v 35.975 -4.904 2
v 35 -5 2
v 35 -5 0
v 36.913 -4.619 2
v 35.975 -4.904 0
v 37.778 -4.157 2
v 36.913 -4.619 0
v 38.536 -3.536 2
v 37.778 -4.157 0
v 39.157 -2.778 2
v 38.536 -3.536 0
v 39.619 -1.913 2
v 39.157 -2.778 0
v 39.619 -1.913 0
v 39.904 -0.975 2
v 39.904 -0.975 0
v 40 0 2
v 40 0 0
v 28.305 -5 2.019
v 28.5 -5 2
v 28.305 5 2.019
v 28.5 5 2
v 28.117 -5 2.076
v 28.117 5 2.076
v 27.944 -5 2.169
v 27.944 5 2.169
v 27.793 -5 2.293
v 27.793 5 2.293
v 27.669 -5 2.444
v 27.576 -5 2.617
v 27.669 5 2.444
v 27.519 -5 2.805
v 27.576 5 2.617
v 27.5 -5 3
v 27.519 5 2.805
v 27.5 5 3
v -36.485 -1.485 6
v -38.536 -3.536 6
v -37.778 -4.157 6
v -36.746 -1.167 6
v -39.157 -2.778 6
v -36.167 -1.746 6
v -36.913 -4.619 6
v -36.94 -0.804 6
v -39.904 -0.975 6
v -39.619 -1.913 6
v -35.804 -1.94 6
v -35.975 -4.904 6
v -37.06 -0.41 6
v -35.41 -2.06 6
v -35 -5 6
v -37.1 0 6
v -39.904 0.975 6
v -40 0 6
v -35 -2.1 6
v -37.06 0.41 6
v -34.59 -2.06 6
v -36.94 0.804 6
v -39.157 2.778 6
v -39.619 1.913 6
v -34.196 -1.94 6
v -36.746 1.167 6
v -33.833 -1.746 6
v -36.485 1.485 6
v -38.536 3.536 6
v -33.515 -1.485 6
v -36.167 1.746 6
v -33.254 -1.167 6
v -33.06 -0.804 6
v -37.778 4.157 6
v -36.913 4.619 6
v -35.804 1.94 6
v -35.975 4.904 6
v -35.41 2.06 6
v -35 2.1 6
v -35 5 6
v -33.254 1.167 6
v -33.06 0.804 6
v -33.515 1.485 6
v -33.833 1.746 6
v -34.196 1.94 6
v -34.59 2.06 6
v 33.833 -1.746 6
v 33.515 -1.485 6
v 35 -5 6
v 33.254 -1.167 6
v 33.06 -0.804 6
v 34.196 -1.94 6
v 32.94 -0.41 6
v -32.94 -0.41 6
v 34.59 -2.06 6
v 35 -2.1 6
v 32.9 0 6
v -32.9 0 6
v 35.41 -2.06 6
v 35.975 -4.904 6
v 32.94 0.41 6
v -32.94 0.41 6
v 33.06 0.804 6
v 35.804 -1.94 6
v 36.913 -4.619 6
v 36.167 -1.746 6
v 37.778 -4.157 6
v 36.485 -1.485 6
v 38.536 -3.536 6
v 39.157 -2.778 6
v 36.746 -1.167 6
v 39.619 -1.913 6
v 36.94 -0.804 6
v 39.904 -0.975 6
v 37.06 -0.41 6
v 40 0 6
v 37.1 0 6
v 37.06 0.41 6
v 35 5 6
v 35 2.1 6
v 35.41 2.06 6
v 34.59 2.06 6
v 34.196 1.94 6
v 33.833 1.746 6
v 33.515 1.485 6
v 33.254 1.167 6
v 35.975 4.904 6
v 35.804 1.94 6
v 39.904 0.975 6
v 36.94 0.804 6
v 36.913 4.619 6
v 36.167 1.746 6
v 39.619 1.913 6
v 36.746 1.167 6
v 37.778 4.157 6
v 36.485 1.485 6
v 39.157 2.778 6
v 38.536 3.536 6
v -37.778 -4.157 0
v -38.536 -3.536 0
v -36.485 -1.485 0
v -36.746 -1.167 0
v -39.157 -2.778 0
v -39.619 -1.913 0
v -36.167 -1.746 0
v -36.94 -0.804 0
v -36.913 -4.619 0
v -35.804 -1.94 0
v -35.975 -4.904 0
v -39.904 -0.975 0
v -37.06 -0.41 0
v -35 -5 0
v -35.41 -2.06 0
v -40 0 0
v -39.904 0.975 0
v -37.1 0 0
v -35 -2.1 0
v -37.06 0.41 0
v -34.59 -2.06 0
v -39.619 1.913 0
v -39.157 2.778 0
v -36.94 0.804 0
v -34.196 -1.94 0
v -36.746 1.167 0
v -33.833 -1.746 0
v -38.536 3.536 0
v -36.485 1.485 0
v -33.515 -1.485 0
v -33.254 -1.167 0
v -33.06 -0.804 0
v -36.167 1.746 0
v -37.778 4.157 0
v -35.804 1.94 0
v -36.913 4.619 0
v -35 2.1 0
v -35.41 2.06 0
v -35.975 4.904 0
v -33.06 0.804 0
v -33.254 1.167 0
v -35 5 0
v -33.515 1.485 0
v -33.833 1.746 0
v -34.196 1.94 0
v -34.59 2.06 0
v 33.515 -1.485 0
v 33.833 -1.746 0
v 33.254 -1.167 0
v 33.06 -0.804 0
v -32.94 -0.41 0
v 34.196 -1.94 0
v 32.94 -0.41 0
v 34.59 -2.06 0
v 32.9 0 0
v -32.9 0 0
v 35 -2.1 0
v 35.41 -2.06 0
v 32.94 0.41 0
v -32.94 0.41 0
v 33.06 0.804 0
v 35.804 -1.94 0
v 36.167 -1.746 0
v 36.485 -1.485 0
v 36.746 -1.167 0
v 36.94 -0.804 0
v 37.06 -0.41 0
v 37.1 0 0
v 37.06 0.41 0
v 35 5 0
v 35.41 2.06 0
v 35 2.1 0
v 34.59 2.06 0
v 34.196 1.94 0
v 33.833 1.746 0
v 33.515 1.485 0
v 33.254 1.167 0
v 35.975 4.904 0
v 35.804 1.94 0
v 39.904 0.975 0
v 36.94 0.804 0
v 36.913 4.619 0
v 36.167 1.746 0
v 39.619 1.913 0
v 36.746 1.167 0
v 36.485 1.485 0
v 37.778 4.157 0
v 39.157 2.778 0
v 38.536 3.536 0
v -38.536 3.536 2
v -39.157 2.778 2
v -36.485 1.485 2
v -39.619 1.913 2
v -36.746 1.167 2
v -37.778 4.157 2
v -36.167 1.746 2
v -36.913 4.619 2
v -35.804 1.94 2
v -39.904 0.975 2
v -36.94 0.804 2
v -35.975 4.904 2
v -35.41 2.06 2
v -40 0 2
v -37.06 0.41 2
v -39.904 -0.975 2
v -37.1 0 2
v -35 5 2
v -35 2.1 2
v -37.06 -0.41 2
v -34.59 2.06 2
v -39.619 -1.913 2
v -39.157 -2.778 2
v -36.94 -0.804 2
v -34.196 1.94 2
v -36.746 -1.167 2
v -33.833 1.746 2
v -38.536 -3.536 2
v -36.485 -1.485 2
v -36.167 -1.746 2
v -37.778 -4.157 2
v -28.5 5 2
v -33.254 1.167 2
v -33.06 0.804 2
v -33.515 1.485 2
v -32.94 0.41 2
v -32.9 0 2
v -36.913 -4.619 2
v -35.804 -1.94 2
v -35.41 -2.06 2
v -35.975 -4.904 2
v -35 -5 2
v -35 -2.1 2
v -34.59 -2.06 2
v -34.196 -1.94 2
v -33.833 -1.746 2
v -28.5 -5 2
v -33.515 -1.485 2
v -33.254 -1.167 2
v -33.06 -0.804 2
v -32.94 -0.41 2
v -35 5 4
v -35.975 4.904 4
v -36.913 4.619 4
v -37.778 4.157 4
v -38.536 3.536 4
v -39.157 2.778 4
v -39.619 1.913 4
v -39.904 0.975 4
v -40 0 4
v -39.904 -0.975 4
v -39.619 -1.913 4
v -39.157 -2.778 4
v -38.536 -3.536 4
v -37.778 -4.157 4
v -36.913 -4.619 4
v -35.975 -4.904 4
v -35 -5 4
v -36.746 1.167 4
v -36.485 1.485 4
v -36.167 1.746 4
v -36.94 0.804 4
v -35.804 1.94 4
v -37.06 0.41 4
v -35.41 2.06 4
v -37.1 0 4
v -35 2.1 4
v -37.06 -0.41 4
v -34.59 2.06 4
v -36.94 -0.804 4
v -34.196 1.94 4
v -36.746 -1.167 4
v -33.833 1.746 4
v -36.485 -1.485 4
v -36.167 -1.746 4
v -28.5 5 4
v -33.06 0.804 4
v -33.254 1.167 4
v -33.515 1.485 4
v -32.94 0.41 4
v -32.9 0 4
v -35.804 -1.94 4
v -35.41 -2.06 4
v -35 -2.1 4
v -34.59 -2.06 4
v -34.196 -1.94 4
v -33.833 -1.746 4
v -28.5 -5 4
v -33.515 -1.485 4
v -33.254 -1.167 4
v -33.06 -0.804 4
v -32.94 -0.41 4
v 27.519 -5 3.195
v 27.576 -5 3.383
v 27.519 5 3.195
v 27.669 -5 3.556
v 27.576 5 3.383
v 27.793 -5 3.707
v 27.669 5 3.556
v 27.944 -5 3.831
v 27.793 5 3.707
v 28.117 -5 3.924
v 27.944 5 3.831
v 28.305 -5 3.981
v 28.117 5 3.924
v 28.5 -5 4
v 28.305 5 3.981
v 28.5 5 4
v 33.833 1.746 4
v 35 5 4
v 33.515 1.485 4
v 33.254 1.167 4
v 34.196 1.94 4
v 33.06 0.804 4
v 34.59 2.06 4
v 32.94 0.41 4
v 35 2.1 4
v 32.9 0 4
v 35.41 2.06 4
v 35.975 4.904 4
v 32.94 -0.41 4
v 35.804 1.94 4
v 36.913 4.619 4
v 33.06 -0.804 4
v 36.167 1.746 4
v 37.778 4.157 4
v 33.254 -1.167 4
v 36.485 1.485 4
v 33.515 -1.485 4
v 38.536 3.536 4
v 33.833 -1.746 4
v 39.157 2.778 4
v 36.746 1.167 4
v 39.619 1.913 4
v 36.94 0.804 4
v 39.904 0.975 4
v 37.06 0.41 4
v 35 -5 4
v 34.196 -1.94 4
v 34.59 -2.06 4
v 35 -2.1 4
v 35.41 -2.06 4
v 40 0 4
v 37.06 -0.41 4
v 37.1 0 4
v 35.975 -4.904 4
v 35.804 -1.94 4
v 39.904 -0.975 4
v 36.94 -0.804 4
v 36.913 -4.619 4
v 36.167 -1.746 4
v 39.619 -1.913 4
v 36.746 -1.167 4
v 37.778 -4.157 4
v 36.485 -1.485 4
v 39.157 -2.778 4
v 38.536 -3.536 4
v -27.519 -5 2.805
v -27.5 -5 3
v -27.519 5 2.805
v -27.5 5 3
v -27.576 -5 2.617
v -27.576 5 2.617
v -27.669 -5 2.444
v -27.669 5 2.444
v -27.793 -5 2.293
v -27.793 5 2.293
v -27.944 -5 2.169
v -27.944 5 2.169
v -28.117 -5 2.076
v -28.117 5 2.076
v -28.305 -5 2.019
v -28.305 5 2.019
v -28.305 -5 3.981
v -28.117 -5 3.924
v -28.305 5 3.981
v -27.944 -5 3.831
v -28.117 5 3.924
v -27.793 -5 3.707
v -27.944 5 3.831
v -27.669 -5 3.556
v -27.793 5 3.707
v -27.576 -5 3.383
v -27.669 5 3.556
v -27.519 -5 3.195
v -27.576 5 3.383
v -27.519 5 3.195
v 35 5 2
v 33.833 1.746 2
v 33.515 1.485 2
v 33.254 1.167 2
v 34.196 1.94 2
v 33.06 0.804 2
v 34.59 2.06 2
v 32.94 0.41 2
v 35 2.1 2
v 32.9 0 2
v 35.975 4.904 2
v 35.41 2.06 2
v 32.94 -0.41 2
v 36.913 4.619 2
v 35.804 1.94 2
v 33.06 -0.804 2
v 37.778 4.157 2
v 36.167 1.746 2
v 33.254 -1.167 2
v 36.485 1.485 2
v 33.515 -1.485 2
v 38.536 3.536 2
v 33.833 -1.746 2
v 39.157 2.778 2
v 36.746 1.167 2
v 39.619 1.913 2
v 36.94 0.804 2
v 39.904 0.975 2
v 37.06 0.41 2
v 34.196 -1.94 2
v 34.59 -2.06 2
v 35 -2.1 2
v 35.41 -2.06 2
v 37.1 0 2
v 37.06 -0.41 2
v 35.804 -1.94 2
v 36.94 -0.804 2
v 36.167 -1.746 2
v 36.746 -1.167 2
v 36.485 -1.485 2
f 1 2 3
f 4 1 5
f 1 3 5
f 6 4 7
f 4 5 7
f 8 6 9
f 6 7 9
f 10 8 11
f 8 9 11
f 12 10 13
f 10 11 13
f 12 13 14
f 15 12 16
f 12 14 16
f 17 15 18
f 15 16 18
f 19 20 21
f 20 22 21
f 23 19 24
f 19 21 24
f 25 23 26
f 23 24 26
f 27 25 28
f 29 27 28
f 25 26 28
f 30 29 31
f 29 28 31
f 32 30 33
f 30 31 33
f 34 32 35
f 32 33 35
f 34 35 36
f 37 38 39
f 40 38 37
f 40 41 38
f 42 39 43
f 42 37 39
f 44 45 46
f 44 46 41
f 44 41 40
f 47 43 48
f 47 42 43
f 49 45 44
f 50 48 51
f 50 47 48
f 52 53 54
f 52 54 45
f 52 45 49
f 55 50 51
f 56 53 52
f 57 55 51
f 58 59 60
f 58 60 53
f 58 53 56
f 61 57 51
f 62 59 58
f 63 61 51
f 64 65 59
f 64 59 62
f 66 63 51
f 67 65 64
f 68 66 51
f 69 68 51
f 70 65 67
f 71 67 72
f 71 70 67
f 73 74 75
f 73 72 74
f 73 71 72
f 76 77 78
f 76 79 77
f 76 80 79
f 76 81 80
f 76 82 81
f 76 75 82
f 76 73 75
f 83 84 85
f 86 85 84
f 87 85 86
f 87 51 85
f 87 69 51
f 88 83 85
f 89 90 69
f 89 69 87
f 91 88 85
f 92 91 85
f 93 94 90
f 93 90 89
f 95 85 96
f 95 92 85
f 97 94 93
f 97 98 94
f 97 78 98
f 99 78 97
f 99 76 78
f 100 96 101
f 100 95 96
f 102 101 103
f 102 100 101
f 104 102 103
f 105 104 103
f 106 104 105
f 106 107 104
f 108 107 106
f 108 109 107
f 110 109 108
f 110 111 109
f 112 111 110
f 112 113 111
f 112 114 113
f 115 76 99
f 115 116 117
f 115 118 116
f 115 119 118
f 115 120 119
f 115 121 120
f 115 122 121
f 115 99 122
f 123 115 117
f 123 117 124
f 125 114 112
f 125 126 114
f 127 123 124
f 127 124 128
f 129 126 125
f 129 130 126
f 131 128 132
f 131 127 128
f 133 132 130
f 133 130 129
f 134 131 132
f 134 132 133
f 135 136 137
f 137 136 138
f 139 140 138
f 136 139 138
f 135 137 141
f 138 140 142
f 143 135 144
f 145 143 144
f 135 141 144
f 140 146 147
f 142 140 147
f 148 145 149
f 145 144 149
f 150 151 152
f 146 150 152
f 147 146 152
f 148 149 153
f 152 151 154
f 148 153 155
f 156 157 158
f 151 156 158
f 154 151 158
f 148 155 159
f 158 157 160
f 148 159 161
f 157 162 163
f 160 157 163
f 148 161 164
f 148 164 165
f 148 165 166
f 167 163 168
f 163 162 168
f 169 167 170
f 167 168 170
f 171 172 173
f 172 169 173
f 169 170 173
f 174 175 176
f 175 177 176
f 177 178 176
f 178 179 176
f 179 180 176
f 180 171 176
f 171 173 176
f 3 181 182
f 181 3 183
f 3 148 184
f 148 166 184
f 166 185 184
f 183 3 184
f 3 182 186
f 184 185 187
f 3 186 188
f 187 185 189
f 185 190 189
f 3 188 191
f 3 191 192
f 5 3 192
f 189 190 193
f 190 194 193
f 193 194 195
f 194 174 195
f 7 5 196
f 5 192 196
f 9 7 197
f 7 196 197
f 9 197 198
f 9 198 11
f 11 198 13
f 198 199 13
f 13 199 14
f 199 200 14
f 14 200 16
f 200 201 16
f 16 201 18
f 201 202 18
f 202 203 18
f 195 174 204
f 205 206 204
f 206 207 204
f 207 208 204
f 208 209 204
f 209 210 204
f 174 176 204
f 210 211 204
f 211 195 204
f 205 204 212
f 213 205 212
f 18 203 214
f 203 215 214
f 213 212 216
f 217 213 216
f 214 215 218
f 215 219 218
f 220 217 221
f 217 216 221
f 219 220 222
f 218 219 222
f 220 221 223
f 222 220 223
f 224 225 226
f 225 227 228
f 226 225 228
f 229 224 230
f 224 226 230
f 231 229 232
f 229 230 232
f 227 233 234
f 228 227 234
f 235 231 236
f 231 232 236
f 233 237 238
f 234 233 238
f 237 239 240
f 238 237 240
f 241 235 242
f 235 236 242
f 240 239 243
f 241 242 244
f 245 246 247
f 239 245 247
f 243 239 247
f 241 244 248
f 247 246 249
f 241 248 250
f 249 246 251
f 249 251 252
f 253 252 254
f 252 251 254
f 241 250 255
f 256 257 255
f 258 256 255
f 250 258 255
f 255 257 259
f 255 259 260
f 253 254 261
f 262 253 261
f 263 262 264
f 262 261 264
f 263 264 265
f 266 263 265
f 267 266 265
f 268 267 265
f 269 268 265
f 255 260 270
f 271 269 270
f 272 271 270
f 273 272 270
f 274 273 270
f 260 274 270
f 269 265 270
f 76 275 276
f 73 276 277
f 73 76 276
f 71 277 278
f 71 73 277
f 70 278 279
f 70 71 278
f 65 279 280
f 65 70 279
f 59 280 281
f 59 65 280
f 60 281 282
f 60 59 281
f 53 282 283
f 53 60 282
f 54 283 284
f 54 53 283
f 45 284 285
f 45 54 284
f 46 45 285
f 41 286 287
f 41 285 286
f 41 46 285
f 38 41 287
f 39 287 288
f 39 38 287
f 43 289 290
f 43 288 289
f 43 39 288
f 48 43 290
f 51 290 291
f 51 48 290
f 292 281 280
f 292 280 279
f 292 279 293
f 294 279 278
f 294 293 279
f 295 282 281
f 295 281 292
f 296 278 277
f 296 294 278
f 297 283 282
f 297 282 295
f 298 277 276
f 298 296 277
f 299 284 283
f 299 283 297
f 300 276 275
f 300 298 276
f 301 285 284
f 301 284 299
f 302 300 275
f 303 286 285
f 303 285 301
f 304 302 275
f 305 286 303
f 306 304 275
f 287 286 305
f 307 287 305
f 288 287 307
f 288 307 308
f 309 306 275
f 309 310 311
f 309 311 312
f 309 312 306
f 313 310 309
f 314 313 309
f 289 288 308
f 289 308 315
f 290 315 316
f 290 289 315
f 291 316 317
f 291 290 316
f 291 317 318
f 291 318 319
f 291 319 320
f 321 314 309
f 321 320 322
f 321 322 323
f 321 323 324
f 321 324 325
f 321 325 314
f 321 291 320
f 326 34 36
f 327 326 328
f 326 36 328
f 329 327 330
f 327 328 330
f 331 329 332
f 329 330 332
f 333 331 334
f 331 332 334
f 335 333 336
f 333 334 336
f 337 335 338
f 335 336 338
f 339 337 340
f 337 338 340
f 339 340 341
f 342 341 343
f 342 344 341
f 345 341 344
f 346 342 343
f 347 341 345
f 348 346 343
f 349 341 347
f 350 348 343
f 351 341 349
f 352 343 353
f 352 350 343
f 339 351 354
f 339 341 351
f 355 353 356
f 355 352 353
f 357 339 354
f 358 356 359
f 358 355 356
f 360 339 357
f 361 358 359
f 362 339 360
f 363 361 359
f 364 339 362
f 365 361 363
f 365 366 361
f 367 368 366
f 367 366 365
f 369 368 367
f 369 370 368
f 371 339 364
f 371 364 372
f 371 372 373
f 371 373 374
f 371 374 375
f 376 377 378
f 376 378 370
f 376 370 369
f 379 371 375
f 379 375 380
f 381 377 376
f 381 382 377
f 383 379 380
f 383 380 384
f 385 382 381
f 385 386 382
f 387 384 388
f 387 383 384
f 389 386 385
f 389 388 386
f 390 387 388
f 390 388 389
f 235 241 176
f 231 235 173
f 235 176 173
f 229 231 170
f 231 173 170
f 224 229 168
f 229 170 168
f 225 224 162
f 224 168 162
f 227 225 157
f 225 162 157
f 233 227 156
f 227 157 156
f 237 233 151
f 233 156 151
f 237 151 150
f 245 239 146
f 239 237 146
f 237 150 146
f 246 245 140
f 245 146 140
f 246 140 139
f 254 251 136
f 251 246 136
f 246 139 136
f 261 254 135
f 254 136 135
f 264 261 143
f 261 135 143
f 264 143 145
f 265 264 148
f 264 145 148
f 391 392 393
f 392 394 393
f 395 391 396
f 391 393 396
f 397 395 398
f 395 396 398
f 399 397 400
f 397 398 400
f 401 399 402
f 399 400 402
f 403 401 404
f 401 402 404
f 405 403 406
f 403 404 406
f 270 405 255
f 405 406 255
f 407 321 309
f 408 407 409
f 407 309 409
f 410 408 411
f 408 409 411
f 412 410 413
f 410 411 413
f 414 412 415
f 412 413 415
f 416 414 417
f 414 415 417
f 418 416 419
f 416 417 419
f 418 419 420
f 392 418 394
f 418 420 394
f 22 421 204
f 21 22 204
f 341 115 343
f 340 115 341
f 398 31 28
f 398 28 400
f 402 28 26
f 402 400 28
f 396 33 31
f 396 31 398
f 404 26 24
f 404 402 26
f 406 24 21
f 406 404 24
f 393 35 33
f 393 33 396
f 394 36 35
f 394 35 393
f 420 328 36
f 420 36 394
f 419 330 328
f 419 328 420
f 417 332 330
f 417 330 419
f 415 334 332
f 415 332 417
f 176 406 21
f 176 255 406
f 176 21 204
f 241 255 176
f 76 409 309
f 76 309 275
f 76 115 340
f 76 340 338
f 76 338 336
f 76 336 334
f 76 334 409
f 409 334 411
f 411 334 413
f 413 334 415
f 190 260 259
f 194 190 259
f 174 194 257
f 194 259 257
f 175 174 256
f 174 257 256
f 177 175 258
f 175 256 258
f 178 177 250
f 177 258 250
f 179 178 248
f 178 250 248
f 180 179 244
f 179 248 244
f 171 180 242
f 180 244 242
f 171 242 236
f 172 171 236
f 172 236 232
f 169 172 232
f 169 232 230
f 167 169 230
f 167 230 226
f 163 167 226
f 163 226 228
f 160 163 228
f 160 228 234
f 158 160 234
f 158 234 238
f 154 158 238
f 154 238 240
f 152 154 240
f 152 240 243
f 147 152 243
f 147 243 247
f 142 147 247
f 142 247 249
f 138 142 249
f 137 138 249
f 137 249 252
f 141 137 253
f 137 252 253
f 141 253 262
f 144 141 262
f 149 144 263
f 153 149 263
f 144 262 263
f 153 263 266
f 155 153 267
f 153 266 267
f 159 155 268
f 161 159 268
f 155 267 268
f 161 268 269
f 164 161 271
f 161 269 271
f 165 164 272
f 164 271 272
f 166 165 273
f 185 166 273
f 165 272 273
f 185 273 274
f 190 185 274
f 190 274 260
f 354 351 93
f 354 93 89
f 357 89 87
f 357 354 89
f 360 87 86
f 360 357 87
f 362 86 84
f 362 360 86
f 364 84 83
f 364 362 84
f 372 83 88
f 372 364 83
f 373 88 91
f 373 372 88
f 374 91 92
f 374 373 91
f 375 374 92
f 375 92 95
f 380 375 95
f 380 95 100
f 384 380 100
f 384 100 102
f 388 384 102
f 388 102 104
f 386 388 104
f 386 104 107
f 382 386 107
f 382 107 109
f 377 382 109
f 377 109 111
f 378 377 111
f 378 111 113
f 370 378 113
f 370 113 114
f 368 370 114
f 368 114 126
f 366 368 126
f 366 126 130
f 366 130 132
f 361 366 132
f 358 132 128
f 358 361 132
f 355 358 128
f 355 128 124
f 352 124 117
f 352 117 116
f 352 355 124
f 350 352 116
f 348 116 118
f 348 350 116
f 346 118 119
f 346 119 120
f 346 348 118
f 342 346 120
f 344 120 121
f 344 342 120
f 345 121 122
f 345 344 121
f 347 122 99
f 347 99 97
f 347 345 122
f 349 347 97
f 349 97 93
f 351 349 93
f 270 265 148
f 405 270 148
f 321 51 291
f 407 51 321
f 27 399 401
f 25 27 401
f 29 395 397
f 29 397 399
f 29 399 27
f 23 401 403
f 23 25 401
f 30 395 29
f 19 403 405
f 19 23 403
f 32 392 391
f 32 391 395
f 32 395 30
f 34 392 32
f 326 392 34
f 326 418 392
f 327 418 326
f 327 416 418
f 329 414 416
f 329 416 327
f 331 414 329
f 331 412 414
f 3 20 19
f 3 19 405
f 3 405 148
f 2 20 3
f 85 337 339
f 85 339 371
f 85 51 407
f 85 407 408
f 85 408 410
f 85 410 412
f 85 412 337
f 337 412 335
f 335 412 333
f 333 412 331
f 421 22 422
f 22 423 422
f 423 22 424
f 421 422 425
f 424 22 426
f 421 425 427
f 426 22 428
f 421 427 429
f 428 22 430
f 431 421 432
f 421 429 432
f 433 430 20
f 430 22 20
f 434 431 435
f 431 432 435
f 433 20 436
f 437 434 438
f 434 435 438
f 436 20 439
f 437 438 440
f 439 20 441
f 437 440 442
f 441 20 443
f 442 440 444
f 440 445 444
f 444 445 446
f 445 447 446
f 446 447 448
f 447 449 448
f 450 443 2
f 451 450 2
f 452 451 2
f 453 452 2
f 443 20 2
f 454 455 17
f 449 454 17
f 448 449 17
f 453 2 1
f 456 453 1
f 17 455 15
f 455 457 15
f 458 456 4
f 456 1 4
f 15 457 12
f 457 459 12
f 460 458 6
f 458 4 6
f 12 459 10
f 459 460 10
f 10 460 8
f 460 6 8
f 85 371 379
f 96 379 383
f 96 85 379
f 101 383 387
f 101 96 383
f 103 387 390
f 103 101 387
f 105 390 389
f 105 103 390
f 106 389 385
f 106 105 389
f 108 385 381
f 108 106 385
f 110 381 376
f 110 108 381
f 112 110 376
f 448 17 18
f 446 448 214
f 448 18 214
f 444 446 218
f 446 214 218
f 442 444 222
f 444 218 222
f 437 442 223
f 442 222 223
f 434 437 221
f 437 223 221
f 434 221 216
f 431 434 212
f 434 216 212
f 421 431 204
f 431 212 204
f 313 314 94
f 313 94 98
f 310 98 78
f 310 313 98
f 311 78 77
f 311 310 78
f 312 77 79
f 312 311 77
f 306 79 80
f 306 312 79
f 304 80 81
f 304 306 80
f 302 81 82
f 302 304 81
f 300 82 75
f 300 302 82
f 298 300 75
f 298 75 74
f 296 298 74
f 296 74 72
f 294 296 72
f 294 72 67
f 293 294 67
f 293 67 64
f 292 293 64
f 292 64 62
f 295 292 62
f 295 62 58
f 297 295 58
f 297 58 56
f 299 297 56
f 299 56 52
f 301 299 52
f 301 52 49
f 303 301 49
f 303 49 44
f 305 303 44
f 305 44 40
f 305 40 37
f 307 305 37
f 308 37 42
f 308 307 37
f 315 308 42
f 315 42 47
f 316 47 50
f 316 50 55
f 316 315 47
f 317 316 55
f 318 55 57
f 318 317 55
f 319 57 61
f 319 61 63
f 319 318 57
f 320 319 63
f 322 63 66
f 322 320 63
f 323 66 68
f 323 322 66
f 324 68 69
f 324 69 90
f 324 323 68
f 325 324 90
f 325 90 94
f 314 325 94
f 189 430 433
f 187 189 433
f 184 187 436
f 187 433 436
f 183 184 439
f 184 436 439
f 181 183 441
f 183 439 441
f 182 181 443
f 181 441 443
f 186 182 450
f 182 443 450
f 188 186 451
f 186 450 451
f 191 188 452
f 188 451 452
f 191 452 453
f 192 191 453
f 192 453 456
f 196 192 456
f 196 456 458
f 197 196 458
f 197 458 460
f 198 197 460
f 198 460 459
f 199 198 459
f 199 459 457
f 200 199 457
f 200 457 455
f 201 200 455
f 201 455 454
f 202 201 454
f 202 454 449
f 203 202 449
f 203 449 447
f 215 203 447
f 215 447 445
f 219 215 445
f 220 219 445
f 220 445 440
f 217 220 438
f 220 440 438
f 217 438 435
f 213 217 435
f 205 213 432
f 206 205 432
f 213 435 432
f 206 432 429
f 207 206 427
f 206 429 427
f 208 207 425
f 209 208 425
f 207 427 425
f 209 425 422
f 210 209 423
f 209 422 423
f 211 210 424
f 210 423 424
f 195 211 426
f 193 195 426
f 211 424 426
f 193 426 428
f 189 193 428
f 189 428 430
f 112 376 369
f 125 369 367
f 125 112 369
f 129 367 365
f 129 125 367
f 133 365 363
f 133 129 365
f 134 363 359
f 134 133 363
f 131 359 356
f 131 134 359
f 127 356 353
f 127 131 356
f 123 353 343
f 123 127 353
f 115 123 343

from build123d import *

# Parameters (mm, degrees)
BOSS_EXTRUDE1_DEPTH     = 6
SKETCH2_R               = 2.1
CUT_EXTRUDE1_DEPTH      = 41.755367745
CUT_EXTRUDE2_DEPTH      = 10
CUT_EXTRUDE2_DEPTH_BACK = 10
SKETCH3_W               = 25
SKETCH3_H               = 2
FILLET5_R               = 1


with BuildPart() as part:
    # Sketch1 → Boss-Extrude1 (new body)
    with BuildSketch(Plane.XY):
        with BuildLine():
            ThreePointArc((35, -5), (30, 0), (35, 5))
            Line((35, 5), (-35, 5))
            ThreePointArc((-35, 5), (-31.464466094, 3.535533906), (-30, 0))
            ThreePointArc((-30, 0), (-31.464466094, -3.535533906), (-35, -5))
            Line((-35, -5), (35, -5))
        make_face()
        with BuildLine():
            ThreePointArc((-30, 0), (-31.464466094, 3.535533906), (-35, 5))
            ThreePointArc((-35, 5), (-40, 0), (-35, -5))
            ThreePointArc((-35, -5), (-31.464466094, -3.535533906), (-30, 0))
        make_face()
        with BuildLine():
            ThreePointArc((40, 0), (38.535533906, 3.535533906), (35, 5))
            ThreePointArc((35, 5), (30, 0), (35, -5))
            ThreePointArc((35, -5), (38.535533906, -3.535533906), (40, 0))
        make_face()
    extrude(amount=BOSS_EXTRUDE1_DEPTH)

    # Sketch2 → Cut-Extrude1 (cut, through all)
    with BuildSketch(Plane.XY.offset(6)):
        with Locations((-35, 0)):
            Circle(SKETCH2_R)
        with Locations(Location((35, 0, 0), (0, 0, 180))):
            Circle(SKETCH2_R)
    extrude(amount=-CUT_EXTRUDE1_DEPTH, mode=Mode.SUBTRACT)

    # Sketch3 → Cut-Extrude2 (cut, two sides: drawn at the far end of the back side and taken through both)
    with BuildSketch(Plane(origin=(0, 0, 0), x_dir=(1, 0, 0), z_dir=(0, 1, 0)).offset(-CUT_EXTRUDE2_DEPTH_BACK)):
        with Locations((-40, -3)):
            Rectangle(SKETCH3_W, SKETCH3_H)
        with Locations((40, -3)):
            Rectangle(SKETCH3_W, SKETCH3_H)
    extrude(amount=CUT_EXTRUDE2_DEPTH + CUT_EXTRUDE2_DEPTH_BACK, mode=Mode.SUBTRACT)

    # SurfaceCut1
    split(bisect_by=Plane.XY.offset(3), keep=Keep.BOTTOM)

    # Mirror12: part across plane


with BuildPart() as part_1:
    add(part.part)
    add(part.part.mirror(Plane.XY.offset(3)))

    # Fillet5
    fillet5_edges = [part_1.edges().sort_by_distance(p)[0] for p in [
        (-27.5, 0, 2),
        (27.5, 0, 2),
        (27.5, 0, 4),
        (-27.5, 0, 4),
    ]]
    fillet(fillet5_edges, radius=FILLET5_R - 0.0001)  # a hair under: the kernel refuses the full size


solid = part_1.part
